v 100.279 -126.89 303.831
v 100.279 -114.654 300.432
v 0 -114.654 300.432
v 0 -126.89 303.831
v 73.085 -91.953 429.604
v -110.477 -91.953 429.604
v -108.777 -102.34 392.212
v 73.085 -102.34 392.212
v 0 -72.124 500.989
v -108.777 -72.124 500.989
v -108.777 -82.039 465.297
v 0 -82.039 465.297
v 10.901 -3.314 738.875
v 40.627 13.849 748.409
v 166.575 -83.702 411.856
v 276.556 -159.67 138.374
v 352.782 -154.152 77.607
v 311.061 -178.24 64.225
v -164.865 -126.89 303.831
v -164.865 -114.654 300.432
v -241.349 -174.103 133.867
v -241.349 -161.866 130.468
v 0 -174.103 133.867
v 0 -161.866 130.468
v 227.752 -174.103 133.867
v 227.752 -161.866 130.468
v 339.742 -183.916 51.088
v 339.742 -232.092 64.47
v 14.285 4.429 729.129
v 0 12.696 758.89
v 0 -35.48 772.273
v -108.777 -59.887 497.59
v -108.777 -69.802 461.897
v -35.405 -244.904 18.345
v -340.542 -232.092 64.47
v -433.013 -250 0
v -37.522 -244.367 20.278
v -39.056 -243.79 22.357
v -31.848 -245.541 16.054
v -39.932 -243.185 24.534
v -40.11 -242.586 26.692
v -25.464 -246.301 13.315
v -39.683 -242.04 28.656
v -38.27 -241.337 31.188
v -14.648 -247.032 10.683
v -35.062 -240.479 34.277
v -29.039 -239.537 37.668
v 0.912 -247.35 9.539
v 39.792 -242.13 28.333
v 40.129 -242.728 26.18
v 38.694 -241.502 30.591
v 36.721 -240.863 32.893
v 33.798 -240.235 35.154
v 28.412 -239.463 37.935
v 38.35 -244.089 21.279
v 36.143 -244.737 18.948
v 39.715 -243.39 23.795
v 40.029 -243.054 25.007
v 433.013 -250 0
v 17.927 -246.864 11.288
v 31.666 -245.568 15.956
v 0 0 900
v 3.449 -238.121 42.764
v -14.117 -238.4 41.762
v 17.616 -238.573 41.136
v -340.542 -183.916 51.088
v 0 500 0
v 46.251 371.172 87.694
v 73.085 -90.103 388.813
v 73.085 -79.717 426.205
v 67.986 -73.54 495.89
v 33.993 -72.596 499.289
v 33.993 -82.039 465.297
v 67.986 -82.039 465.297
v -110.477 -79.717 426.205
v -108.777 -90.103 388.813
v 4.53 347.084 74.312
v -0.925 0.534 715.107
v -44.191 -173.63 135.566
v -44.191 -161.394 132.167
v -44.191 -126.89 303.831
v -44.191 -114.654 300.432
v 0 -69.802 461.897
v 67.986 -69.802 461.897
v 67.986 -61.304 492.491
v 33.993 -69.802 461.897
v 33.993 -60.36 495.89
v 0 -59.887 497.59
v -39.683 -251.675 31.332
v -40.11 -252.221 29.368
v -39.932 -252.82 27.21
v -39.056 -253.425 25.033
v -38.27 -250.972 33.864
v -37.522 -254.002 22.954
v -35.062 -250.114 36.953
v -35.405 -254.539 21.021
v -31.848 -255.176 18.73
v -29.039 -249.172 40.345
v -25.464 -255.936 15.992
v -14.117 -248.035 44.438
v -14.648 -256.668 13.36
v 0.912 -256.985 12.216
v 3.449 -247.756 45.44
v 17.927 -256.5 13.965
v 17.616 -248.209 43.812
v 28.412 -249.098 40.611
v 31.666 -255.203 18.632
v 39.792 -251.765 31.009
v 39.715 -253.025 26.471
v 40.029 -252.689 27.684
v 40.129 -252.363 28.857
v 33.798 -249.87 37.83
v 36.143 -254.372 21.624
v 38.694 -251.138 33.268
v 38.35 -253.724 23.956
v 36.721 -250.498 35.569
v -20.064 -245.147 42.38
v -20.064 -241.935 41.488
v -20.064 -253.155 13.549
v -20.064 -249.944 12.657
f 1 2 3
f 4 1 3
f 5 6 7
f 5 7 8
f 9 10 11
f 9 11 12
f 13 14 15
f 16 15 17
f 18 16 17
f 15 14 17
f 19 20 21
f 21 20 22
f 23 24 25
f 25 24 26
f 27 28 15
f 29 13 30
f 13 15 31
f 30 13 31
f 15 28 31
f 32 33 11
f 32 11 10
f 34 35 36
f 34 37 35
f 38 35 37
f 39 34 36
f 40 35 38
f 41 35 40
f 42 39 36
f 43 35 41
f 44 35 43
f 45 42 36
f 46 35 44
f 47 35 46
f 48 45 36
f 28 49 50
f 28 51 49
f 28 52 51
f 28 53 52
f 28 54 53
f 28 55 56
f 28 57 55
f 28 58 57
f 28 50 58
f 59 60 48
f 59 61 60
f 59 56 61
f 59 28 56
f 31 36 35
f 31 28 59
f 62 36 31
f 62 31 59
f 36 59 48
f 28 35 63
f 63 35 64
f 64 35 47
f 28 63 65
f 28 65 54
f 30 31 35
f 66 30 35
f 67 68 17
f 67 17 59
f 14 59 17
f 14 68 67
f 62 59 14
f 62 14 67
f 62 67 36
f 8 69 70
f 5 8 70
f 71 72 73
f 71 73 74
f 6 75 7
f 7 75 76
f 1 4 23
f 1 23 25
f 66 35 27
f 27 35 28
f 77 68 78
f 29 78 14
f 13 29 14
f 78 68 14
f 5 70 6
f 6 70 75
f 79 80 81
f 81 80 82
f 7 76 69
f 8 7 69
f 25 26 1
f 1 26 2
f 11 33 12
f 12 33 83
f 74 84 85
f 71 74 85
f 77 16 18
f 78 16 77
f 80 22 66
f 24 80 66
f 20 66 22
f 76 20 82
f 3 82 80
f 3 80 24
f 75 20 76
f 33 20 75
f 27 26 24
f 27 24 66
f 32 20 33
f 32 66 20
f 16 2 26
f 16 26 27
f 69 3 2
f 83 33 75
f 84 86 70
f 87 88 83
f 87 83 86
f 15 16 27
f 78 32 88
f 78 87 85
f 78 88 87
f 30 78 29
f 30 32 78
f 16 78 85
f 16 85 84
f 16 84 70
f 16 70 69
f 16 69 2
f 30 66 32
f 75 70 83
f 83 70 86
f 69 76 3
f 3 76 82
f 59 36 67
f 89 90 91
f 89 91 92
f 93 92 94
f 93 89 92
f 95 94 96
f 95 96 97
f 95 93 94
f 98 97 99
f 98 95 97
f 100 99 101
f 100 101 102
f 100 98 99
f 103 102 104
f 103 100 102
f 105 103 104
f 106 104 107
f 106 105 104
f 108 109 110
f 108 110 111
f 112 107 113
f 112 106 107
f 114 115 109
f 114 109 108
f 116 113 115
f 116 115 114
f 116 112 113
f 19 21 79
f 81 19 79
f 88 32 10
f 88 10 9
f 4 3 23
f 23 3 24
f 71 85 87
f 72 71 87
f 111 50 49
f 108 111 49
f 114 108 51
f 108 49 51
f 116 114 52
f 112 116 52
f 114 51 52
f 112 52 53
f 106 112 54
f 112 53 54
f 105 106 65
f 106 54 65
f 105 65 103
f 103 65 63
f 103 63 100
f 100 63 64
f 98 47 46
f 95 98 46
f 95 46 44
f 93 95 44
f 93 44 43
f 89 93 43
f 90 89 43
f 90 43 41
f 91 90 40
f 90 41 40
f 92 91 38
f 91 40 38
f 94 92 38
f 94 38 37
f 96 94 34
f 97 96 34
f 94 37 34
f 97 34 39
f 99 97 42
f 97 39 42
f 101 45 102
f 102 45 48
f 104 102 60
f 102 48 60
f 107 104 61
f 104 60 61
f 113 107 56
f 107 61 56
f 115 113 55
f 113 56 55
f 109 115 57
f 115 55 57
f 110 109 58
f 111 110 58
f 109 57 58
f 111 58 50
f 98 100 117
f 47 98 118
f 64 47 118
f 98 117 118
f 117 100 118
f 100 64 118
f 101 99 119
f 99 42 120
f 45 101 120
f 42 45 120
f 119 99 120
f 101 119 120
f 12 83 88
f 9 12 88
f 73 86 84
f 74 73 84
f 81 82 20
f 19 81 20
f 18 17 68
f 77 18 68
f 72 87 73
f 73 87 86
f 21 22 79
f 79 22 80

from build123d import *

# Parameters (mm, degrees)
F6_DEPTH  = 50
F8_DEPTH  = 50
F11_DEPTH = 10
F9_W      = 108.7769791484
F9_H      = 37.0438992977
F12_DEPTH = 12.7


with BuildPart() as f4:
    # F0 (on Top) → F4 section 0
    with BuildSketch(Plane.XY, mode=Mode.PRIVATE) as f4_s0:
        Polygon((-433.0127018922, -250), (433.0127018922, -250), (0, 500), align=None)
    loft([f4_s0.sketch, Vertex(0, 0, 900)])

    # F5 (on face) → F6 (cut)
    with BuildSketch(Plane(origin=(0, -232.0916905444, 64.4699140401), x_dir=(1, 0, 0), z_dir=(0, -0.9635179096, 0.2676438638))):
        Polygon((339.7423923016, 0), (0, 734.6025705338), (-340.5417487738, 0), align=None)
    extrude(amount=-F6_DEPTH, mode=Mode.SUBTRACT)

    # F7 (on face) → F8 (cut)
    with BuildSketch(Plane(origin=(200.9973000187, 116.0458452722, 64.4699140401), x_dir=(-0.458738865, 0.8763037769, -0.1471405596), z_dir=(0.8344309867, 0.4817589548, 0.2676438638))):
        Polygon((291.1387085915, 69.377720356), (-116.6230589151, 700.2393603325), (-308.3382844925, -33.8495075703), align=None)
    extrude(amount=-F8_DEPTH, mode=Mode.SUBTRACT)

    # F10 (on face) → F11 (join)
    with BuildSketch(Plane(origin=(0, -232.0916905444, 64.4699140401), x_dir=(1, 0, 0), z_dir=(0, -0.9635179096, 0.2676438638))):
        with BuildLine():
            add(Edge.make_bspline(
                [(40.1289761066, -39.7394858301), (40.1289761066, -9.8174087107), (-20.0644880533, -24.7784472704), (-80.2579522133, -39.7394858301), (-20.0644880533, -54.7005243897), (40.1289761066, -69.6615629494), (40.1289761066, -39.7394858301)],
                knots=[0, 0, 0, 2.0943951024, 2.0943951024, 4.1887902048, 4.1887902048, 6.2831853072, 6.2831853072, 6.2831853072], degree=2, weights=[1, 0.5, 1, 0.5, 1, 0.5, 1]))
        make_face()
    extrude(amount=F11_DEPTH)

    # F9 (on face) → F12 (join)
    with BuildSketch(Plane(origin=(0, -183.9157950629, 51.0877208508), x_dir=(1, 0, 0), z_dir=(0, -0.9635179096, 0.2676438638))):
        Polygon((-164.8651063442, 258.7849199772), (-241.3489073515, 82.3854953051), (-44.1906489432, 84.1495096684), (-44.1906489432, 258.7849199772), align=None)
        Polygon((100.2787798643, 258.7849199772), (0, 258.7849199772), (0, 82.3854953051), (227.7518063784, 82.3854953051), align=None)
        Polygon((-110.4766204953, 389.3205523491), (-108.7769791484, 350.5126535892), (73.084525764, 350.5126535892), (73.084525764, 389.3205523491), align=None)
        with Locations((-54.3884895742, 444.886341691)):
            Rectangle(F9_W, F9_H)
        Polygon((67.9856017232, 458.1163227558), (33.9928083122, 461.6443216801), (33.9928083122, 426.3643920422), (67.9856017232, 426.3643920422), align=None)
    extrude(amount=F12_DEPTH)


solid = f4.part
